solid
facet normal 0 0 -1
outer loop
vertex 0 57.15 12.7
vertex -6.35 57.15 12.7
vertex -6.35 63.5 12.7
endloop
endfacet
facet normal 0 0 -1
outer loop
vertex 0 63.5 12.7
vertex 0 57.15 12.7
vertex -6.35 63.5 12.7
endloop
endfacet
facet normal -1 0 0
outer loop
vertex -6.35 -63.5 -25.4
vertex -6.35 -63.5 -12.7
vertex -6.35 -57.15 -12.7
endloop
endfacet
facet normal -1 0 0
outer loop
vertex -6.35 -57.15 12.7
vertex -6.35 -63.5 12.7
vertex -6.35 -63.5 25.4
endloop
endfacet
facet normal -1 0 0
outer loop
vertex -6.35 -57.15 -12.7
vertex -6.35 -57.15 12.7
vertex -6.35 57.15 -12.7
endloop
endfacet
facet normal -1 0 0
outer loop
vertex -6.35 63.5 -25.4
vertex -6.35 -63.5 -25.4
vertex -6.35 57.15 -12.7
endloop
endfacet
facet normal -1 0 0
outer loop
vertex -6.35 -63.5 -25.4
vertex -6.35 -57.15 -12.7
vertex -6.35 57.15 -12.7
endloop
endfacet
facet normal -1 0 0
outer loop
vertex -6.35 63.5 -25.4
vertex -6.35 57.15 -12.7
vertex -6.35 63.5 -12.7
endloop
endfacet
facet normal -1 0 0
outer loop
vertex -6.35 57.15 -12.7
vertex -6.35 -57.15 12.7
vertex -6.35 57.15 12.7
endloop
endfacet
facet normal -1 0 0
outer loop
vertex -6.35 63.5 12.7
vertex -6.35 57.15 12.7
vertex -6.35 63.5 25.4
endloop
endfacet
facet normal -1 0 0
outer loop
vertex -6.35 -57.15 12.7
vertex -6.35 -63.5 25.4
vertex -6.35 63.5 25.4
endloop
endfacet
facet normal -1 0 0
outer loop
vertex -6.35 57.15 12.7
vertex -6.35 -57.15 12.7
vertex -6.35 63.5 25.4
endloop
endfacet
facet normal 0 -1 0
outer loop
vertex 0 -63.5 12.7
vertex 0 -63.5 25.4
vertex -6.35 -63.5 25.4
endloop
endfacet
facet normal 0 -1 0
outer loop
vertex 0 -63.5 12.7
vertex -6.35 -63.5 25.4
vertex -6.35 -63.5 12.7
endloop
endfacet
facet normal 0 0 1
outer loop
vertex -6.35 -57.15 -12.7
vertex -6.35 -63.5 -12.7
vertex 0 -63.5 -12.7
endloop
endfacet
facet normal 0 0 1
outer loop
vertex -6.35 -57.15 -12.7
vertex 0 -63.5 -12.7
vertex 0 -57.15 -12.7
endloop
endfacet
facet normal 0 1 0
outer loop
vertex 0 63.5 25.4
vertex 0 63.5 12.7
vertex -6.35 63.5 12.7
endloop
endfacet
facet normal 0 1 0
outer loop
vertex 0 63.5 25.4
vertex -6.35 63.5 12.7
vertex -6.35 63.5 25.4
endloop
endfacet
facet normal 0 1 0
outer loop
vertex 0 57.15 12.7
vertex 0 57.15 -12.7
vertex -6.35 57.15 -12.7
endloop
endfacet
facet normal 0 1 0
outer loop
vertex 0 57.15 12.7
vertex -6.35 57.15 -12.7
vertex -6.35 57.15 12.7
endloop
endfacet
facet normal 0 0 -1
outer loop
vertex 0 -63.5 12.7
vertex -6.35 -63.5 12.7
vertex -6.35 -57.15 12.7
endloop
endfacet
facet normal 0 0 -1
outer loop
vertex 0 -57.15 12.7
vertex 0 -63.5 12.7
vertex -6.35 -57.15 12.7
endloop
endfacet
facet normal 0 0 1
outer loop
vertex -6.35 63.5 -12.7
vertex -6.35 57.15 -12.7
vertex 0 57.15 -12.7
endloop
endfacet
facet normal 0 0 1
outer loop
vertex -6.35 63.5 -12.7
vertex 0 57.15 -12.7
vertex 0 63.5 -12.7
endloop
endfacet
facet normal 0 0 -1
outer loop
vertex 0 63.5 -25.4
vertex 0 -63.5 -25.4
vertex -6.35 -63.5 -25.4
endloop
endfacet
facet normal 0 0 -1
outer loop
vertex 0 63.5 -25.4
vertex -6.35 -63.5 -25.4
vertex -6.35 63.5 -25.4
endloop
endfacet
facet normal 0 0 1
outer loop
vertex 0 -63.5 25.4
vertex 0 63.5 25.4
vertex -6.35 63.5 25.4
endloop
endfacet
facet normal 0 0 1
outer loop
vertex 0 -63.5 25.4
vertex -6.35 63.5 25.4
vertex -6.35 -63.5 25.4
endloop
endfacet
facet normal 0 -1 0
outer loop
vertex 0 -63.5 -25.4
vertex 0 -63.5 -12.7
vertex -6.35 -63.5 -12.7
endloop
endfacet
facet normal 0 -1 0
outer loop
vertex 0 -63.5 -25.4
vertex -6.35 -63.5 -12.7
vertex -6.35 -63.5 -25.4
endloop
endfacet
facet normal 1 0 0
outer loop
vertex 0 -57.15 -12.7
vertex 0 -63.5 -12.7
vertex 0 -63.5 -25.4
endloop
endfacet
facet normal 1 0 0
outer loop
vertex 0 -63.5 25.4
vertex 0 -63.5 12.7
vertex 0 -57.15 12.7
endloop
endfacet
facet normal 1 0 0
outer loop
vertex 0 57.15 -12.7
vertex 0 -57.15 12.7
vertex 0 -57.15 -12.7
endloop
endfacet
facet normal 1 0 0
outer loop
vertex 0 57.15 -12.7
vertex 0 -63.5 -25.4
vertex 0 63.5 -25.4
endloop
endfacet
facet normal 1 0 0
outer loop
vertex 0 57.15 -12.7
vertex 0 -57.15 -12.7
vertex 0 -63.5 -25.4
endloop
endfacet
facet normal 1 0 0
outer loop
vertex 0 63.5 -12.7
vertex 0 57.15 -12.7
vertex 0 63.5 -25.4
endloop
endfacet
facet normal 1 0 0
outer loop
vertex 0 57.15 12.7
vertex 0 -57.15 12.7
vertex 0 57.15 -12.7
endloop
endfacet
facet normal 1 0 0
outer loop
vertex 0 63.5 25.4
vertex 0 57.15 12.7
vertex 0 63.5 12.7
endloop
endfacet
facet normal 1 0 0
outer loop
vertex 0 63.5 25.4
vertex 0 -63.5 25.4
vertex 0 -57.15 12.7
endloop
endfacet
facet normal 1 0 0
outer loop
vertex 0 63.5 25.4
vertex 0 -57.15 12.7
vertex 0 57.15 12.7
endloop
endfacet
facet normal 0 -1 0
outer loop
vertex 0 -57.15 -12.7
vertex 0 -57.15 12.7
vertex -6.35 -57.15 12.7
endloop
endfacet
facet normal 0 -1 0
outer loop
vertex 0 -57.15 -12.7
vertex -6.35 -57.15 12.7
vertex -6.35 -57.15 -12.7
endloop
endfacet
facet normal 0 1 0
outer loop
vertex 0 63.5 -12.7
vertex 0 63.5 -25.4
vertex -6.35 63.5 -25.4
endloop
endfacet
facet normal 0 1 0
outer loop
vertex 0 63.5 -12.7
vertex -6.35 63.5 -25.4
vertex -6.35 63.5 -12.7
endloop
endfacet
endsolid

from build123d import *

# Parameters (mm, degrees)
F0_W     = 6.35
F0_H     = 6.35
F1_DEPTH = 6.35


with BuildPart() as f1:
    # F0 (on Right) → F1 (new body)
    with BuildSketch(Plane.YZ):
        with Locations((60.325, 22.225)):
            Rectangle(F0_W, F0_H)
        Polygon((57.15, 19.05), (57.15, 25.4), (-57.15, 25.4), (-57.15, 19.05), (-57.15, 12.7), (-57.15, -12.7), (-57.15, -19.05), (-57.15, -25.4), (57.15, -25.4), (57.15, -19.05), (57.15, -12.7), (57.15, 12.7), align=None)
        with Locations((60.325, 15.875)):
            Rectangle(F0_W, F0_H)
        with Locations((-60.325, 22.225)):
            Rectangle(F0_W, F0_H)
        with Locations((-60.325, 15.875)):
            Rectangle(F0_W, F0_H)
        with Locations((60.325, -15.875)):
            Rectangle(F0_W, F0_H)
        with Locations((-60.325, -15.875)):
            Rectangle(F0_W, F0_H)
        with Locations((60.325, -22.225)):
            Rectangle(F0_W, F0_H)
        with Locations((-60.325, -22.225)):
            Rectangle(F0_W, F0_H)
    extrude(amount=-F1_DEPTH)


solid = f1.part
